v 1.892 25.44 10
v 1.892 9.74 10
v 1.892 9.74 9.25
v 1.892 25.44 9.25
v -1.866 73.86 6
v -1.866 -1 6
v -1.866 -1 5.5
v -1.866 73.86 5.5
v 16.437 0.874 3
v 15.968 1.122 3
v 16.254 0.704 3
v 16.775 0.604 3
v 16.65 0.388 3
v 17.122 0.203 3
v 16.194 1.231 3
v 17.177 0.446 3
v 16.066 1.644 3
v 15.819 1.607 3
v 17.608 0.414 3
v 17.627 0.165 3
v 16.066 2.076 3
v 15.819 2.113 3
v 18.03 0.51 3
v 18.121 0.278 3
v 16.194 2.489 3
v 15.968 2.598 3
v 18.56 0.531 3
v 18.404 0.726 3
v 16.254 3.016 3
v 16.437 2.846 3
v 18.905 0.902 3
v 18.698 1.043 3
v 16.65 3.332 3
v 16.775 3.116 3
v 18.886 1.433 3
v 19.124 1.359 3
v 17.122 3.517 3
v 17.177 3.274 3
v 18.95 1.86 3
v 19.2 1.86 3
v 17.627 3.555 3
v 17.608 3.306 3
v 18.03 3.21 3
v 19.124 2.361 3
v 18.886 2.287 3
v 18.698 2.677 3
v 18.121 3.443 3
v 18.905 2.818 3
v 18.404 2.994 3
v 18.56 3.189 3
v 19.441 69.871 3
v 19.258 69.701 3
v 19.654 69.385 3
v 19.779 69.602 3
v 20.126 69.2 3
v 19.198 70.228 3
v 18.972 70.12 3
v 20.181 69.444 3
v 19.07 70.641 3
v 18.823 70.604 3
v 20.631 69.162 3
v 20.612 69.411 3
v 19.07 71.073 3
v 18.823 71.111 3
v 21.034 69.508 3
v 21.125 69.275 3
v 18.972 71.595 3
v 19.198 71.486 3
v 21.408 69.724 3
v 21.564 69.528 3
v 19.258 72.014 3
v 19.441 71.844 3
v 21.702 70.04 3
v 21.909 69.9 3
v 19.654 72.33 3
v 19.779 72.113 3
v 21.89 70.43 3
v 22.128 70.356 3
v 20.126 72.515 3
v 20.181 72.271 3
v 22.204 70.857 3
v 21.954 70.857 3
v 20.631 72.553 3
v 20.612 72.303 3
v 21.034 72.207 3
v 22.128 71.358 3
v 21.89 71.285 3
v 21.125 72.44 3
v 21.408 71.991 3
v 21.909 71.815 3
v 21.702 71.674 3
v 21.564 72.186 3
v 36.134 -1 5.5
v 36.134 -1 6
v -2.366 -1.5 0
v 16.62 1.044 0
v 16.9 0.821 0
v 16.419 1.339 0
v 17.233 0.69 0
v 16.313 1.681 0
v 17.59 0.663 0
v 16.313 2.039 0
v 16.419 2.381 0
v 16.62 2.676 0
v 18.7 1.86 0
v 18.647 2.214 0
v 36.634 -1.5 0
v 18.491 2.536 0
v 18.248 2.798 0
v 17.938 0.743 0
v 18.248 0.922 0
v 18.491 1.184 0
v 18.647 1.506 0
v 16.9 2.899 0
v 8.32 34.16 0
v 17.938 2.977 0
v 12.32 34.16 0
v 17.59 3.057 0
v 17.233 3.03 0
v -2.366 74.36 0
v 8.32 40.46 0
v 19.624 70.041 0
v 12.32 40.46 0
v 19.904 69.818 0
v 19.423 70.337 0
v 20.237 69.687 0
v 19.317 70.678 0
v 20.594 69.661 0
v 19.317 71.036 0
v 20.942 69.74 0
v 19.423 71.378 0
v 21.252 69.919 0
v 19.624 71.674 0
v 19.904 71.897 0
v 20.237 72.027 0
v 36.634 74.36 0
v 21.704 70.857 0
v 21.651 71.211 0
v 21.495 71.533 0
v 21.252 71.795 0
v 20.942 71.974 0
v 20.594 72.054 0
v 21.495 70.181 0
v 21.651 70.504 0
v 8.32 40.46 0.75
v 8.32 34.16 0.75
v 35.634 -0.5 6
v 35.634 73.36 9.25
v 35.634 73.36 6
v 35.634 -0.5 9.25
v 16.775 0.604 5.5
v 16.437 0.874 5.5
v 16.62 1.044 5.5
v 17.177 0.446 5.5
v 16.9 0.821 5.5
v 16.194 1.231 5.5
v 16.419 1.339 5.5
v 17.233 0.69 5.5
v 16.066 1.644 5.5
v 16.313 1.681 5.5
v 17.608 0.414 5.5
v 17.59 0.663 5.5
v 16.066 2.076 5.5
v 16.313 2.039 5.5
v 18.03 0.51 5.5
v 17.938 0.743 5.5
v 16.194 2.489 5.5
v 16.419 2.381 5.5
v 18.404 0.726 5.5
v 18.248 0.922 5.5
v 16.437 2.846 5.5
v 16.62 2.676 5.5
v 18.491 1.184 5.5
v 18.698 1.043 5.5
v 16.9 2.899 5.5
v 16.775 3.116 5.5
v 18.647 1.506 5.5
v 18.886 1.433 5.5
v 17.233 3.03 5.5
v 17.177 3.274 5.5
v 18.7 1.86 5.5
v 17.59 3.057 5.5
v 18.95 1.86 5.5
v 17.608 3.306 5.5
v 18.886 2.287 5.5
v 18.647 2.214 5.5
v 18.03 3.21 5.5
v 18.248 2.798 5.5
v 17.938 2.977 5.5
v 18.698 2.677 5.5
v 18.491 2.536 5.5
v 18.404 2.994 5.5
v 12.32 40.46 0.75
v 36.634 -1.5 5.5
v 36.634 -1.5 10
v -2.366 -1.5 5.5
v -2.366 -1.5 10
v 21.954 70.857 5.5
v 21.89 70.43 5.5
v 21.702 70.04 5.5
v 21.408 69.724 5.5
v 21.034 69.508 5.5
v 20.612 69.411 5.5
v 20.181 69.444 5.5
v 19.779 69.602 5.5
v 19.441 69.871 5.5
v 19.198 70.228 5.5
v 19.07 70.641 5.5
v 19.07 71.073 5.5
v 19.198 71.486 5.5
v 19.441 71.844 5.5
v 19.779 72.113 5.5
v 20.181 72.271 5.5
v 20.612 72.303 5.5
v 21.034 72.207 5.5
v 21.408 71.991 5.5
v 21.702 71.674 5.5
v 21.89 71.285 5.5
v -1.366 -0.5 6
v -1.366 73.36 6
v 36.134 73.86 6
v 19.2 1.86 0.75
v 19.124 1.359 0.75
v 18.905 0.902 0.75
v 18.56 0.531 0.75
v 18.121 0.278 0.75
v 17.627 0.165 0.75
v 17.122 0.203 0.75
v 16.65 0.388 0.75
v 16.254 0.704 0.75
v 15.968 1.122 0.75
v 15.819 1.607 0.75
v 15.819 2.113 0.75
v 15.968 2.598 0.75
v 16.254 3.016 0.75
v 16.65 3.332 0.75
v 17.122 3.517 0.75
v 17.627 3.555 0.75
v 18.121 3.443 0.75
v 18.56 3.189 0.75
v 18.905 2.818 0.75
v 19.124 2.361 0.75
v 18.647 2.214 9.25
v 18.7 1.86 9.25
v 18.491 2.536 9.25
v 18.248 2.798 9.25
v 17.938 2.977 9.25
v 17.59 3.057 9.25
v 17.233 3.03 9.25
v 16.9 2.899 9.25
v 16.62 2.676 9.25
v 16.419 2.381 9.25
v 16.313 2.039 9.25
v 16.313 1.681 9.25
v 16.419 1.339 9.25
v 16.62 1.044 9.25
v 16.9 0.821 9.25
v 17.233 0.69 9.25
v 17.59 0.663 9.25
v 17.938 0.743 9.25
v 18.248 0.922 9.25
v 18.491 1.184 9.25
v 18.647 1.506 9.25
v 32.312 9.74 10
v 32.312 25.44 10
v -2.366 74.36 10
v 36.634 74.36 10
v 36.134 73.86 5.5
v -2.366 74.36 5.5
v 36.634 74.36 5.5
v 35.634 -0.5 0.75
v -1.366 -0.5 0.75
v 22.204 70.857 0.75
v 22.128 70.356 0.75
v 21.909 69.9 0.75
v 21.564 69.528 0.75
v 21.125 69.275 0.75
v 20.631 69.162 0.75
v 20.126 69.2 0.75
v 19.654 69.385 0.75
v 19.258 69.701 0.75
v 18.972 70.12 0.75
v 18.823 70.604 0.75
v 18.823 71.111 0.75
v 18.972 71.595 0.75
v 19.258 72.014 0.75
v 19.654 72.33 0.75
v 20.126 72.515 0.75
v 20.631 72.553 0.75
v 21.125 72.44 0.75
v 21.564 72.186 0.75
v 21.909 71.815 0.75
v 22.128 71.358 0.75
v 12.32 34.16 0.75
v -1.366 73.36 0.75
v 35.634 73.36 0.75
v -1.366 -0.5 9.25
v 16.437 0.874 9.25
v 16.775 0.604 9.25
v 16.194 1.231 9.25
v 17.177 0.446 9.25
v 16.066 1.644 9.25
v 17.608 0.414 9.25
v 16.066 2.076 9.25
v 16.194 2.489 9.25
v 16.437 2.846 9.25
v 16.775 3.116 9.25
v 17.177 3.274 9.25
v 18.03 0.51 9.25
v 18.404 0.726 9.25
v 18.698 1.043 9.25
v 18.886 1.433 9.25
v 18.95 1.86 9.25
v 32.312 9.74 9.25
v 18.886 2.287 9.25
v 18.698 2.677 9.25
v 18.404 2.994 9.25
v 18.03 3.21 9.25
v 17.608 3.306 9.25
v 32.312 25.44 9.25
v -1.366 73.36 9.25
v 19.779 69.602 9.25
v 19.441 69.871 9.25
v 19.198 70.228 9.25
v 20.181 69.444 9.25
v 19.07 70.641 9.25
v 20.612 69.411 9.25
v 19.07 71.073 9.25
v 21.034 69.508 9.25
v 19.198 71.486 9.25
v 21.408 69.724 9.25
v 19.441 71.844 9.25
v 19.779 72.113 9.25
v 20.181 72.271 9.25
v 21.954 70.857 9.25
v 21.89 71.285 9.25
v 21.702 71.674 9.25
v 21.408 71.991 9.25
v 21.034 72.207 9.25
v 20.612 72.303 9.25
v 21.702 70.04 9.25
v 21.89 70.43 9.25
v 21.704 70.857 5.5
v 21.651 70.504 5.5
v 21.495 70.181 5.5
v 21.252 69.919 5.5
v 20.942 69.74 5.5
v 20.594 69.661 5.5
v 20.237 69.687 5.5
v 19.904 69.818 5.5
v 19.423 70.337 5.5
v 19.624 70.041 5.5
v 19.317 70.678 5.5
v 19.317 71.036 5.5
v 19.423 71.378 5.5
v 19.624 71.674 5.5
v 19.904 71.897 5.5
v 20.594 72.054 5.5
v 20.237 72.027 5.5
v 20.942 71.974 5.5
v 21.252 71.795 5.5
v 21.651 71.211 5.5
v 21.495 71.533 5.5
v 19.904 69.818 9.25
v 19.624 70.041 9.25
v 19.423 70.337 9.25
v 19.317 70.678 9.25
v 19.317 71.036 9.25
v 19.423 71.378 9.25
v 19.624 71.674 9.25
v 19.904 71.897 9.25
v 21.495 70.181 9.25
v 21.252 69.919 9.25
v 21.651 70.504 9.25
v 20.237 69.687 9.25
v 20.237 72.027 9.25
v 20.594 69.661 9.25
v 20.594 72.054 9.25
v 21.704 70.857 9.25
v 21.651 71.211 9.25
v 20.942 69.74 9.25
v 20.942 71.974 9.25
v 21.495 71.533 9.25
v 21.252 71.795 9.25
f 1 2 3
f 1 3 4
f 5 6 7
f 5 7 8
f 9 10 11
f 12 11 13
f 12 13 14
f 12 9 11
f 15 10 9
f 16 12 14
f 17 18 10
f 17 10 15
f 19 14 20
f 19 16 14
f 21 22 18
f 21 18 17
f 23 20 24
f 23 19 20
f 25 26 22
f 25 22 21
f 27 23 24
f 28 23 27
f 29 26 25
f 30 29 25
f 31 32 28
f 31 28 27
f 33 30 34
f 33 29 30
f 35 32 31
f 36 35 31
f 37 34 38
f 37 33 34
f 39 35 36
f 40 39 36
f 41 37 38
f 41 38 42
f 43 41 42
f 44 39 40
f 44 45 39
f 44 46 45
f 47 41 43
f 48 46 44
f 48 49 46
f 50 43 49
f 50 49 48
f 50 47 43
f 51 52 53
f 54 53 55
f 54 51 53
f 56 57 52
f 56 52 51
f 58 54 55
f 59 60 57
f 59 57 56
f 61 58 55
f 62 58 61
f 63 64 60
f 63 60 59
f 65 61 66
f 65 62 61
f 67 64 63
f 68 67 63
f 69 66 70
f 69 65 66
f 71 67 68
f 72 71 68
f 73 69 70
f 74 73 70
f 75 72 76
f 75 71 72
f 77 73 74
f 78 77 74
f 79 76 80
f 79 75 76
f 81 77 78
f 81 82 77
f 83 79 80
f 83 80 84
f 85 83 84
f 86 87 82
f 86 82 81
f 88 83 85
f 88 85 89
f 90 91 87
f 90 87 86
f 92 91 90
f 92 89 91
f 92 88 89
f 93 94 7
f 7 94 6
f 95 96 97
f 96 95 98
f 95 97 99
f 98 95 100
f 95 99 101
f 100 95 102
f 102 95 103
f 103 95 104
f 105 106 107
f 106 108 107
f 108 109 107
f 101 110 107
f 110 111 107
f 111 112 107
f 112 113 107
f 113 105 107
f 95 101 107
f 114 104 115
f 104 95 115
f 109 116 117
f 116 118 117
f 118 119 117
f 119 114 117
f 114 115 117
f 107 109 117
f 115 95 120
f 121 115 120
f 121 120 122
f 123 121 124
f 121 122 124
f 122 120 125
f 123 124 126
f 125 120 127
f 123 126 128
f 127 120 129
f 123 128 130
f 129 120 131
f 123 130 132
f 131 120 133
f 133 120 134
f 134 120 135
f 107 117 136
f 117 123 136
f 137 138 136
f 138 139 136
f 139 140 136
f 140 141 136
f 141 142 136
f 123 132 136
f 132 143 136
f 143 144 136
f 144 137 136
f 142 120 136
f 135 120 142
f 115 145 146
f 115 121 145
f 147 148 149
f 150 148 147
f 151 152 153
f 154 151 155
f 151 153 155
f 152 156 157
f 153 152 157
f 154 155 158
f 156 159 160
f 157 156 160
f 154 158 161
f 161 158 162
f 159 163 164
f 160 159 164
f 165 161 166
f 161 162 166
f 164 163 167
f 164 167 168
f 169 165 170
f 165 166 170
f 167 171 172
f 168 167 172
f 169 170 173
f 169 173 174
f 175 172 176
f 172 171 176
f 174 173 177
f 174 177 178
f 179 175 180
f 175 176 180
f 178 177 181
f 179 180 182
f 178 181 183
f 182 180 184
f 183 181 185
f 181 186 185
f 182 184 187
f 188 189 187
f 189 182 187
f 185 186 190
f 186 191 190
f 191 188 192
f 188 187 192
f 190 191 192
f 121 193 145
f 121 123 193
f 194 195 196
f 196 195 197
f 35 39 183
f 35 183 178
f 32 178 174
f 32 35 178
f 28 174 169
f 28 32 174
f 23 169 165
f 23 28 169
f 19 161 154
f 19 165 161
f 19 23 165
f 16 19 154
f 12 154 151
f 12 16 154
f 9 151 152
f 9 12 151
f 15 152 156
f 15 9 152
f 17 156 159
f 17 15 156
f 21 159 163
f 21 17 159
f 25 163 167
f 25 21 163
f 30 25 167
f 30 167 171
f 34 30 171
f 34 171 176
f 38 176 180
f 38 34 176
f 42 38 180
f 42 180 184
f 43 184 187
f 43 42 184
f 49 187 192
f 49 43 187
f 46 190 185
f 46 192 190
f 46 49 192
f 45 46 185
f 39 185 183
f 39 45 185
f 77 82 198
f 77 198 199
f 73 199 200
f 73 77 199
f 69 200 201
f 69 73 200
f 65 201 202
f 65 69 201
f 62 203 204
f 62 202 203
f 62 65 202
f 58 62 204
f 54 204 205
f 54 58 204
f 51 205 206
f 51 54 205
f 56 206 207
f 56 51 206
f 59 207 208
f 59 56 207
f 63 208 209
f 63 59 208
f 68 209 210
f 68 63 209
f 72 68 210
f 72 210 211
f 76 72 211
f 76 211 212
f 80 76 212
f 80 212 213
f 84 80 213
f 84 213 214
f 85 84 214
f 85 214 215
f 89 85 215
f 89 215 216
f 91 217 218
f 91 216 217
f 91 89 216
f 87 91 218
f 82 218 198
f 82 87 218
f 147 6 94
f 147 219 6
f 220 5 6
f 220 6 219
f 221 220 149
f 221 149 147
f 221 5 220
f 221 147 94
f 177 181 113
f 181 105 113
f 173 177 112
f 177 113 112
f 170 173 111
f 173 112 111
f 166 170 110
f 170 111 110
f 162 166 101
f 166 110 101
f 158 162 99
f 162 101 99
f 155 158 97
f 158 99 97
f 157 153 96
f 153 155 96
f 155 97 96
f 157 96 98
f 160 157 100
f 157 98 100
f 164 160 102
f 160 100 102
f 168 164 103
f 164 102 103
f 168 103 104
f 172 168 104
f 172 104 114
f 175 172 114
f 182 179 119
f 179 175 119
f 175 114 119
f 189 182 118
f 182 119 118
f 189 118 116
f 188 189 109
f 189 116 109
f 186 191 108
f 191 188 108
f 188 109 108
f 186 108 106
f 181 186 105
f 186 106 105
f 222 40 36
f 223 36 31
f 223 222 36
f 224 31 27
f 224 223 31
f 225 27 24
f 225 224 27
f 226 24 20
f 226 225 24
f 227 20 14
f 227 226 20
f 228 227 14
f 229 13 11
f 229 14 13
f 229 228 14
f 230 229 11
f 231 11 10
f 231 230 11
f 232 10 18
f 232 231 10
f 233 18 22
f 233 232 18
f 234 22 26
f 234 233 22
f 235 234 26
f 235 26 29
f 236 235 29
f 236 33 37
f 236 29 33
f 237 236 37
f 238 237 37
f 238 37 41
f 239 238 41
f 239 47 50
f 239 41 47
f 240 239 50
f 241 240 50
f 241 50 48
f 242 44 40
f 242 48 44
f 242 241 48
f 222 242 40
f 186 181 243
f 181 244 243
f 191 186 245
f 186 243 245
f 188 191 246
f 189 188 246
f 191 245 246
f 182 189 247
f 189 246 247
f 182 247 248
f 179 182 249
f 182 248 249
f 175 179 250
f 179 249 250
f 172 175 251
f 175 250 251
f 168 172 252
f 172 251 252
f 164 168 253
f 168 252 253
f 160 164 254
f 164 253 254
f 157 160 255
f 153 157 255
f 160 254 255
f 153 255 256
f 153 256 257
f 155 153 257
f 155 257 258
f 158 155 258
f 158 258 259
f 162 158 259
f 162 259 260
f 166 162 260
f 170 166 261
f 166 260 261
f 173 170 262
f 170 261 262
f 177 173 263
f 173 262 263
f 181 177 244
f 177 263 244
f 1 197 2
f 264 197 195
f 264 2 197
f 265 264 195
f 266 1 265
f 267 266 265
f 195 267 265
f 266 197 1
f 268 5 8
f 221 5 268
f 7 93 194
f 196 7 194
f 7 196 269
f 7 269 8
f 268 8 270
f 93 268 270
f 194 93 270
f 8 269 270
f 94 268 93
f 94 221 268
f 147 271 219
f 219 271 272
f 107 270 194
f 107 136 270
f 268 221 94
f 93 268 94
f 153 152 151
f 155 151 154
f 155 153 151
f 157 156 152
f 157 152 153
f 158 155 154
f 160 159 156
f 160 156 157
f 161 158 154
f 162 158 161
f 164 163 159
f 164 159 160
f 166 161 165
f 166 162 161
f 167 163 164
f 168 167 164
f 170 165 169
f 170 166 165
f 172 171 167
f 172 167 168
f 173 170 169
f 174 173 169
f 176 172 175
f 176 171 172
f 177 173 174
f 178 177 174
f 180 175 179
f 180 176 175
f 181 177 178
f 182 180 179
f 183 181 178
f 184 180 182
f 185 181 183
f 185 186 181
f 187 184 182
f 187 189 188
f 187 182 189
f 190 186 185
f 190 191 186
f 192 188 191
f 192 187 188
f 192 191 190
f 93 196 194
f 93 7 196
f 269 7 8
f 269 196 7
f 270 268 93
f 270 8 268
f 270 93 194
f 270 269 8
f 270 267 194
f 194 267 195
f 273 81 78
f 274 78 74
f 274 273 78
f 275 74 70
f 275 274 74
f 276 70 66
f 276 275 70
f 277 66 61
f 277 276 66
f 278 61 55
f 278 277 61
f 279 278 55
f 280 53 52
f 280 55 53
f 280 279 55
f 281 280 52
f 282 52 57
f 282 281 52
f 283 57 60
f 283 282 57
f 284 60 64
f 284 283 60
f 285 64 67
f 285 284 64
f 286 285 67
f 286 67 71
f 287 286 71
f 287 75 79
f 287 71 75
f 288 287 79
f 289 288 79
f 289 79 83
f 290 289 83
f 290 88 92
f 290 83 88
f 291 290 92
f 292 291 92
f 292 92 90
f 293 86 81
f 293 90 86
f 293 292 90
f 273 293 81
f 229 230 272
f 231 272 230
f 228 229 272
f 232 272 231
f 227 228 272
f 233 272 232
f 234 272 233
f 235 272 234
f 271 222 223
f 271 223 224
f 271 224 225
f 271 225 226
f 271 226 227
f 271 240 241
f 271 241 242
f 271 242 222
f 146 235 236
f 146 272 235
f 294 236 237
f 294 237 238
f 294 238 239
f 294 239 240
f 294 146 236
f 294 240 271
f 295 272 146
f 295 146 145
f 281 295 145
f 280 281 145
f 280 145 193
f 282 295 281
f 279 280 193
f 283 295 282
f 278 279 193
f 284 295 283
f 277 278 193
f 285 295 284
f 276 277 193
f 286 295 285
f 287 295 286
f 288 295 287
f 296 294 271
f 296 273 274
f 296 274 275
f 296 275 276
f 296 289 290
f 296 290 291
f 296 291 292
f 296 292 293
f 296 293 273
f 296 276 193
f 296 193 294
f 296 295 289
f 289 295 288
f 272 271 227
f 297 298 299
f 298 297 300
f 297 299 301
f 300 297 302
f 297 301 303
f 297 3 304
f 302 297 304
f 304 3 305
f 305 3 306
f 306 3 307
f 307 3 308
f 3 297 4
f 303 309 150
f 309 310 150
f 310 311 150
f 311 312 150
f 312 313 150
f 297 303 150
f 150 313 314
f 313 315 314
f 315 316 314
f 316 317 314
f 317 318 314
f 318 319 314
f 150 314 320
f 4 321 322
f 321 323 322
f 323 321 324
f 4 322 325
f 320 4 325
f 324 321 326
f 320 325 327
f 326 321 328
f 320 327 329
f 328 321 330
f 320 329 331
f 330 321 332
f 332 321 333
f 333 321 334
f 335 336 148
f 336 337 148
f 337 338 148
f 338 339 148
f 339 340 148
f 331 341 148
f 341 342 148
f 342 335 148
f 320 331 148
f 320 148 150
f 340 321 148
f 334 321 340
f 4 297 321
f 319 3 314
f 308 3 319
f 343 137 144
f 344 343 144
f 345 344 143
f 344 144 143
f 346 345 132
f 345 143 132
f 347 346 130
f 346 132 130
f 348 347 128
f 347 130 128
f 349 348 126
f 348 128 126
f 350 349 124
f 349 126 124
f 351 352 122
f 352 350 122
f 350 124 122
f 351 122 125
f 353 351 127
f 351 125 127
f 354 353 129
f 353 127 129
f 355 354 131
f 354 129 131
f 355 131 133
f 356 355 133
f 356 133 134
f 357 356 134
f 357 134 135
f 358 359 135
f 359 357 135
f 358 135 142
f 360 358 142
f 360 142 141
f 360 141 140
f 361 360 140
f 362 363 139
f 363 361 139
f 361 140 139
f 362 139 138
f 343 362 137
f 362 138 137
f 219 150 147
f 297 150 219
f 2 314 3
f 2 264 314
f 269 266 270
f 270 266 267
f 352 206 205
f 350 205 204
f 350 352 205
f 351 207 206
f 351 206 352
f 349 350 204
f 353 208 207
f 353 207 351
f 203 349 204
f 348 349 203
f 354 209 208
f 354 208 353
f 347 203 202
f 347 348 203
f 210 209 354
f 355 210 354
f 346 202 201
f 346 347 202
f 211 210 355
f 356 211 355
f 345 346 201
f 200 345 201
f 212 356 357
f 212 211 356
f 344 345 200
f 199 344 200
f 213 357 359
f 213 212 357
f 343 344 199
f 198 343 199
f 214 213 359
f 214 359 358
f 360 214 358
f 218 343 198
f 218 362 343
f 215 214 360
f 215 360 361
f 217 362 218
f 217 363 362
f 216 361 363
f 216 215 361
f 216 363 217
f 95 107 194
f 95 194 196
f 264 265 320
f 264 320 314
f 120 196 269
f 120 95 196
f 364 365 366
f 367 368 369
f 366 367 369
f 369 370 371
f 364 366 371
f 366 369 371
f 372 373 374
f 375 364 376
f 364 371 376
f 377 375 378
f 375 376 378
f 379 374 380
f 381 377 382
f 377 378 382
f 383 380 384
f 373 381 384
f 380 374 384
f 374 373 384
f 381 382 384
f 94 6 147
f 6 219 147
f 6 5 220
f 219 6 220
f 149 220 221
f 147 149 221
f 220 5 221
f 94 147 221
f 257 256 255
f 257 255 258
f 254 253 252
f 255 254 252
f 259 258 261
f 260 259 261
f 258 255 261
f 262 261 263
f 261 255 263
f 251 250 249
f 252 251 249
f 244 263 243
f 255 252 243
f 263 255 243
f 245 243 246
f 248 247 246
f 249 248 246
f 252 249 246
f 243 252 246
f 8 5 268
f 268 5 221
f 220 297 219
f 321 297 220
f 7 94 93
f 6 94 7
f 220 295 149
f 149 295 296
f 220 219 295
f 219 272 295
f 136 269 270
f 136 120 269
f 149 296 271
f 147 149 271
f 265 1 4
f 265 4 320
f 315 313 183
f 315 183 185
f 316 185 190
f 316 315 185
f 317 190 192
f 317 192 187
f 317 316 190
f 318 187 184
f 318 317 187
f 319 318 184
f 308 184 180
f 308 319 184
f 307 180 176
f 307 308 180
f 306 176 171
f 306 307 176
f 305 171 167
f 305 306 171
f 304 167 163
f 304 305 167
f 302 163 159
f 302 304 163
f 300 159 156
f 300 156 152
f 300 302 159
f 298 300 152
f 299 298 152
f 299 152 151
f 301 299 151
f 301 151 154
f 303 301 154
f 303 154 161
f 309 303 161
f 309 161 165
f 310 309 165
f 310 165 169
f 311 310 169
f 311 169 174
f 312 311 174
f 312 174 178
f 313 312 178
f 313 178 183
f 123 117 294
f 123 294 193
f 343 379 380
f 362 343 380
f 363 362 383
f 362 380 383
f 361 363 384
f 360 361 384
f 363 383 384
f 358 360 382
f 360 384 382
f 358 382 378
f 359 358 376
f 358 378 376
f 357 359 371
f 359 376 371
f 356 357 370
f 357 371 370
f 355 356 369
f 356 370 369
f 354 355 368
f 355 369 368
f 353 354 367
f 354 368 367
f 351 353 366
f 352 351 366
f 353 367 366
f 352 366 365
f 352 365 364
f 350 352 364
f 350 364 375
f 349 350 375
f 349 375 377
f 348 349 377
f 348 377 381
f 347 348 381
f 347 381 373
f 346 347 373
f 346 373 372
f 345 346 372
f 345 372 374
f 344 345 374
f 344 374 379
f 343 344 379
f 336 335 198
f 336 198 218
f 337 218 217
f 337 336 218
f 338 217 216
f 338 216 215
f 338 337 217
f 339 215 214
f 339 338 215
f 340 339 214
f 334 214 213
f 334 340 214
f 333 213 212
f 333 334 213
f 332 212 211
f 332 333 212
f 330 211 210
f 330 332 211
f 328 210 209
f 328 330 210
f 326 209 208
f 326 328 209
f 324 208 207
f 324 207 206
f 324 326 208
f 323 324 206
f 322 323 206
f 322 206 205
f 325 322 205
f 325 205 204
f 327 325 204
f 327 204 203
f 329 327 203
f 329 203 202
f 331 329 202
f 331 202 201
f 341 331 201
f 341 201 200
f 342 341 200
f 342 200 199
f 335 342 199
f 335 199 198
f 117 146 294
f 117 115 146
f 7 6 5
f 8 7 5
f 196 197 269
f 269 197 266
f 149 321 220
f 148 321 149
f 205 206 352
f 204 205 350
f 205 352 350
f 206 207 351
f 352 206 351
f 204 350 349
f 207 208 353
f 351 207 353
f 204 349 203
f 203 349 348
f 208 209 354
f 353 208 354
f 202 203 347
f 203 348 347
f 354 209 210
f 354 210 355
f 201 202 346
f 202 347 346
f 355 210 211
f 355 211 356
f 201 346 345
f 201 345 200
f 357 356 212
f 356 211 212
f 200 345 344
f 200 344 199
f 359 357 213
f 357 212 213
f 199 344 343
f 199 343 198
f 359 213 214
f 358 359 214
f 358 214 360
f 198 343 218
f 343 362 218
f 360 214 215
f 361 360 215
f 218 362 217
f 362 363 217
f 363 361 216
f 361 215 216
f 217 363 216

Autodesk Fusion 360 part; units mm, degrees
sketch "Sketch2" plane through (0, 0, 0) normal (0, 0, 1) x (1, 0, 0)
  line L0 (35.634, -0.5) -> (-1.3663, -0.5)
  line L1 (-1.3663, -0.5) -> (-1.3663, 73.36)
  line L2 (-1.3663, 73.36) -> (35.634, 73.36)
  line L3 (35.634, 73.36) -> (35.634, -0.5)
  line L4 (-0.8663, 72.86) -> (-0.8663, 0) construction
  line L5 (35.634, 0) -> (-0.8663, 0) construction
  line L6 (35.134, 72.86) -> (35.134, 0) construction
  line L7 (-0.8663, 72.86) -> (35.134, 72.86) construction
  circle A0 centre (17.5, 1.8601) radius 1.45
  circle A1 centre (20.504, 70.8573) radius 1.45
  line L8 (12.32, 40.46) -> (8.32, 40.46)
  line L9 (8.32, 40.46) -> (8.32, 34.16)
  line L10 (8.32, 34.16) -> (12.32, 34.16)
  line L11 (12.32, 34.16) -> (12.32, 40.46)
  line L12 (12.02, 34.46) -> (12.02, 40.16) construction
  line L13 (12.02, 34.46) -> (8.62, 34.46) construction
  line L14 (8.62, 40.16) -> (12.02, 40.16) construction
  line L15 (8.62, 40.16) -> (8.62, 34.46) construction
  line L16 (1.8923, 25.4405) -> (32.3123, 25.4405)
  line L17 (32.3123, 25.4405) -> (32.3123, 9.7405)
  line L18 (32.3123, 9.7405) -> (1.8923, 9.7405)
  line L19 (1.8923, 9.7405) -> (1.8923, 25.4405)
  line L20 (2.3923, 24.9405) -> (31.8123, 24.9405)
  line L21 (2.3923, 10.2405) -> (2.3923, 24.9405)
  line L22 (31.8123, 24.9405) -> (31.8123, 10.2405)
  line L23 (31.8123, 10.2405) -> (2.3923, 10.2405)
  line L24 (36.634, 74.36) -> (36.634, -1.5)
  line L25 (36.634, -1.5) -> (-2.3663, -1.5)
  line L26 (-2.3663, -1.5) -> (-2.3663, 74.36)
  line L27 (-2.3663, 74.36) -> (36.634, 74.36)
  line L28 (36.134, 73.86) -> (36.134, -1)
  line L29 (36.134, -1) -> (-1.8663, -1)
  line L30 (-1.8663, -1) -> (-1.8663, 73.86)
  line L31 (-1.8663, 73.86) -> (36.134, 73.86)
  circle A2 centre (20.504, 70.8573) radius 1.2
  circle A3 centre (17.5, 1.8601) radius 1.2
  circle A4 centre (17.5, 1.8601) radius 1.7
  circle A5 centre (20.504, 70.8573) radius 1.7
  dimension "d10" = 0.5
  dimension "d11" = 0.5
  dimension "d12" = 0.5
  dimension "d13" = 0.5
  dimension "d14" = 2.9
  dimension "d15" = 2.9
  dimension "d20" = 0.3
  dimension "d21" = 0.3
  dimension "d22" = 0.3
  dimension "d23" = 0.3
  dimension "d24" = 0.5
  dimension "d25" = 0.5
  dimension "d26" = 0.5
  dimension "d27" = 0.5
  dimension "d30" = -1
  dimension "d35" = -0.5
  dimension "d39" = -0.25
  dimension "d40" = -0.25
  dimension "d57" = 0.25
  dimension "d58" = 0.25
extrude "Extrude2" add sketch "Sketch2" along normal blind 6 contours L24 L25 L26 L27 | L28 L29 L30 L31 makes body 1
extrude "Extrude3" add sketch "Sketch2" along normal blind 0.75 separate body contours L0 L1 L2 L3 | A0 | A1 | L16 L17 L18 L19 | L20 L21 L22 L23 | A2 | A3 | A4 | A5 makes body 2
combine "Combine1" operation add target body 2 tool bodies 1
extrude "Extrude4" cut sketch "Sketch2" against normal blind 0.5 from surface at 6 contours L24 L25 L26 L27 bodies 2
extrude "Extrude5" cut sketch "Sketch2" along normal blind 1 contours A2 | A3 bodies 2
extrude "Extrude6" add sketch "Sketch2" against normal blind 0.75 from surface at 10 separate body contours L0 L1 L2 L3 | A0 | A1 | L8 L9 L10 L11 | L24 L25 L26 L27 | L28 L29 L30 L31 | A2 | A3 | A4 | A5 makes body 3
extrude "Extrude7" add sketch "Sketch2" against normal blind 3.25 from surface at 9.25 separate body contours L24 L25 L26 L27 | L28 L29 L30 L31 makes body 4
combine "Combine2" operation add target body 3 tool bodies 4
extrude "Extrude8" add sketch "Sketch2" against normal blind 0.5 from surface at 6 separate body contours L24 L25 L26 L27 makes body 5
combine "Combine3" operation add target body 3 tool bodies 5
extrude "Extrude9" add sketch "Sketch2" against normal blind 3.75 from surface at 9.25 contours A0 | A1 bodies 3
extrude "Extrude10" add sketch "Sketch2" along normal blind 5.5 separate body contours A0 | A1 makes body 6 at (18.9482, 1.7878, 3.6667) makes body 7 at (21.9522, 70.7851, 3.6667)
combine "Combine4" operation add target body 7 tool bodies 6 2
extrude "Extrude11" add sketch "Sketch2" along normal blind 3 contours A4 | A5 bodies 7
copy_body "Body->Comp1" bodies 3 removing the originals makes body 8 in component "Tampa"
copy_body "Body->Comp2" bodies 7 removing the originals makes body 9 in component "Base"
component "Tampa" placed x (1, 0, 0) y (0, 1, 0) z (0, 0, 1) at (0, 0, 0)
component "Base" placed x (1, 0, 0) y (0, 1, 0) z (0, 0, 1) at (0, 0, 0)
